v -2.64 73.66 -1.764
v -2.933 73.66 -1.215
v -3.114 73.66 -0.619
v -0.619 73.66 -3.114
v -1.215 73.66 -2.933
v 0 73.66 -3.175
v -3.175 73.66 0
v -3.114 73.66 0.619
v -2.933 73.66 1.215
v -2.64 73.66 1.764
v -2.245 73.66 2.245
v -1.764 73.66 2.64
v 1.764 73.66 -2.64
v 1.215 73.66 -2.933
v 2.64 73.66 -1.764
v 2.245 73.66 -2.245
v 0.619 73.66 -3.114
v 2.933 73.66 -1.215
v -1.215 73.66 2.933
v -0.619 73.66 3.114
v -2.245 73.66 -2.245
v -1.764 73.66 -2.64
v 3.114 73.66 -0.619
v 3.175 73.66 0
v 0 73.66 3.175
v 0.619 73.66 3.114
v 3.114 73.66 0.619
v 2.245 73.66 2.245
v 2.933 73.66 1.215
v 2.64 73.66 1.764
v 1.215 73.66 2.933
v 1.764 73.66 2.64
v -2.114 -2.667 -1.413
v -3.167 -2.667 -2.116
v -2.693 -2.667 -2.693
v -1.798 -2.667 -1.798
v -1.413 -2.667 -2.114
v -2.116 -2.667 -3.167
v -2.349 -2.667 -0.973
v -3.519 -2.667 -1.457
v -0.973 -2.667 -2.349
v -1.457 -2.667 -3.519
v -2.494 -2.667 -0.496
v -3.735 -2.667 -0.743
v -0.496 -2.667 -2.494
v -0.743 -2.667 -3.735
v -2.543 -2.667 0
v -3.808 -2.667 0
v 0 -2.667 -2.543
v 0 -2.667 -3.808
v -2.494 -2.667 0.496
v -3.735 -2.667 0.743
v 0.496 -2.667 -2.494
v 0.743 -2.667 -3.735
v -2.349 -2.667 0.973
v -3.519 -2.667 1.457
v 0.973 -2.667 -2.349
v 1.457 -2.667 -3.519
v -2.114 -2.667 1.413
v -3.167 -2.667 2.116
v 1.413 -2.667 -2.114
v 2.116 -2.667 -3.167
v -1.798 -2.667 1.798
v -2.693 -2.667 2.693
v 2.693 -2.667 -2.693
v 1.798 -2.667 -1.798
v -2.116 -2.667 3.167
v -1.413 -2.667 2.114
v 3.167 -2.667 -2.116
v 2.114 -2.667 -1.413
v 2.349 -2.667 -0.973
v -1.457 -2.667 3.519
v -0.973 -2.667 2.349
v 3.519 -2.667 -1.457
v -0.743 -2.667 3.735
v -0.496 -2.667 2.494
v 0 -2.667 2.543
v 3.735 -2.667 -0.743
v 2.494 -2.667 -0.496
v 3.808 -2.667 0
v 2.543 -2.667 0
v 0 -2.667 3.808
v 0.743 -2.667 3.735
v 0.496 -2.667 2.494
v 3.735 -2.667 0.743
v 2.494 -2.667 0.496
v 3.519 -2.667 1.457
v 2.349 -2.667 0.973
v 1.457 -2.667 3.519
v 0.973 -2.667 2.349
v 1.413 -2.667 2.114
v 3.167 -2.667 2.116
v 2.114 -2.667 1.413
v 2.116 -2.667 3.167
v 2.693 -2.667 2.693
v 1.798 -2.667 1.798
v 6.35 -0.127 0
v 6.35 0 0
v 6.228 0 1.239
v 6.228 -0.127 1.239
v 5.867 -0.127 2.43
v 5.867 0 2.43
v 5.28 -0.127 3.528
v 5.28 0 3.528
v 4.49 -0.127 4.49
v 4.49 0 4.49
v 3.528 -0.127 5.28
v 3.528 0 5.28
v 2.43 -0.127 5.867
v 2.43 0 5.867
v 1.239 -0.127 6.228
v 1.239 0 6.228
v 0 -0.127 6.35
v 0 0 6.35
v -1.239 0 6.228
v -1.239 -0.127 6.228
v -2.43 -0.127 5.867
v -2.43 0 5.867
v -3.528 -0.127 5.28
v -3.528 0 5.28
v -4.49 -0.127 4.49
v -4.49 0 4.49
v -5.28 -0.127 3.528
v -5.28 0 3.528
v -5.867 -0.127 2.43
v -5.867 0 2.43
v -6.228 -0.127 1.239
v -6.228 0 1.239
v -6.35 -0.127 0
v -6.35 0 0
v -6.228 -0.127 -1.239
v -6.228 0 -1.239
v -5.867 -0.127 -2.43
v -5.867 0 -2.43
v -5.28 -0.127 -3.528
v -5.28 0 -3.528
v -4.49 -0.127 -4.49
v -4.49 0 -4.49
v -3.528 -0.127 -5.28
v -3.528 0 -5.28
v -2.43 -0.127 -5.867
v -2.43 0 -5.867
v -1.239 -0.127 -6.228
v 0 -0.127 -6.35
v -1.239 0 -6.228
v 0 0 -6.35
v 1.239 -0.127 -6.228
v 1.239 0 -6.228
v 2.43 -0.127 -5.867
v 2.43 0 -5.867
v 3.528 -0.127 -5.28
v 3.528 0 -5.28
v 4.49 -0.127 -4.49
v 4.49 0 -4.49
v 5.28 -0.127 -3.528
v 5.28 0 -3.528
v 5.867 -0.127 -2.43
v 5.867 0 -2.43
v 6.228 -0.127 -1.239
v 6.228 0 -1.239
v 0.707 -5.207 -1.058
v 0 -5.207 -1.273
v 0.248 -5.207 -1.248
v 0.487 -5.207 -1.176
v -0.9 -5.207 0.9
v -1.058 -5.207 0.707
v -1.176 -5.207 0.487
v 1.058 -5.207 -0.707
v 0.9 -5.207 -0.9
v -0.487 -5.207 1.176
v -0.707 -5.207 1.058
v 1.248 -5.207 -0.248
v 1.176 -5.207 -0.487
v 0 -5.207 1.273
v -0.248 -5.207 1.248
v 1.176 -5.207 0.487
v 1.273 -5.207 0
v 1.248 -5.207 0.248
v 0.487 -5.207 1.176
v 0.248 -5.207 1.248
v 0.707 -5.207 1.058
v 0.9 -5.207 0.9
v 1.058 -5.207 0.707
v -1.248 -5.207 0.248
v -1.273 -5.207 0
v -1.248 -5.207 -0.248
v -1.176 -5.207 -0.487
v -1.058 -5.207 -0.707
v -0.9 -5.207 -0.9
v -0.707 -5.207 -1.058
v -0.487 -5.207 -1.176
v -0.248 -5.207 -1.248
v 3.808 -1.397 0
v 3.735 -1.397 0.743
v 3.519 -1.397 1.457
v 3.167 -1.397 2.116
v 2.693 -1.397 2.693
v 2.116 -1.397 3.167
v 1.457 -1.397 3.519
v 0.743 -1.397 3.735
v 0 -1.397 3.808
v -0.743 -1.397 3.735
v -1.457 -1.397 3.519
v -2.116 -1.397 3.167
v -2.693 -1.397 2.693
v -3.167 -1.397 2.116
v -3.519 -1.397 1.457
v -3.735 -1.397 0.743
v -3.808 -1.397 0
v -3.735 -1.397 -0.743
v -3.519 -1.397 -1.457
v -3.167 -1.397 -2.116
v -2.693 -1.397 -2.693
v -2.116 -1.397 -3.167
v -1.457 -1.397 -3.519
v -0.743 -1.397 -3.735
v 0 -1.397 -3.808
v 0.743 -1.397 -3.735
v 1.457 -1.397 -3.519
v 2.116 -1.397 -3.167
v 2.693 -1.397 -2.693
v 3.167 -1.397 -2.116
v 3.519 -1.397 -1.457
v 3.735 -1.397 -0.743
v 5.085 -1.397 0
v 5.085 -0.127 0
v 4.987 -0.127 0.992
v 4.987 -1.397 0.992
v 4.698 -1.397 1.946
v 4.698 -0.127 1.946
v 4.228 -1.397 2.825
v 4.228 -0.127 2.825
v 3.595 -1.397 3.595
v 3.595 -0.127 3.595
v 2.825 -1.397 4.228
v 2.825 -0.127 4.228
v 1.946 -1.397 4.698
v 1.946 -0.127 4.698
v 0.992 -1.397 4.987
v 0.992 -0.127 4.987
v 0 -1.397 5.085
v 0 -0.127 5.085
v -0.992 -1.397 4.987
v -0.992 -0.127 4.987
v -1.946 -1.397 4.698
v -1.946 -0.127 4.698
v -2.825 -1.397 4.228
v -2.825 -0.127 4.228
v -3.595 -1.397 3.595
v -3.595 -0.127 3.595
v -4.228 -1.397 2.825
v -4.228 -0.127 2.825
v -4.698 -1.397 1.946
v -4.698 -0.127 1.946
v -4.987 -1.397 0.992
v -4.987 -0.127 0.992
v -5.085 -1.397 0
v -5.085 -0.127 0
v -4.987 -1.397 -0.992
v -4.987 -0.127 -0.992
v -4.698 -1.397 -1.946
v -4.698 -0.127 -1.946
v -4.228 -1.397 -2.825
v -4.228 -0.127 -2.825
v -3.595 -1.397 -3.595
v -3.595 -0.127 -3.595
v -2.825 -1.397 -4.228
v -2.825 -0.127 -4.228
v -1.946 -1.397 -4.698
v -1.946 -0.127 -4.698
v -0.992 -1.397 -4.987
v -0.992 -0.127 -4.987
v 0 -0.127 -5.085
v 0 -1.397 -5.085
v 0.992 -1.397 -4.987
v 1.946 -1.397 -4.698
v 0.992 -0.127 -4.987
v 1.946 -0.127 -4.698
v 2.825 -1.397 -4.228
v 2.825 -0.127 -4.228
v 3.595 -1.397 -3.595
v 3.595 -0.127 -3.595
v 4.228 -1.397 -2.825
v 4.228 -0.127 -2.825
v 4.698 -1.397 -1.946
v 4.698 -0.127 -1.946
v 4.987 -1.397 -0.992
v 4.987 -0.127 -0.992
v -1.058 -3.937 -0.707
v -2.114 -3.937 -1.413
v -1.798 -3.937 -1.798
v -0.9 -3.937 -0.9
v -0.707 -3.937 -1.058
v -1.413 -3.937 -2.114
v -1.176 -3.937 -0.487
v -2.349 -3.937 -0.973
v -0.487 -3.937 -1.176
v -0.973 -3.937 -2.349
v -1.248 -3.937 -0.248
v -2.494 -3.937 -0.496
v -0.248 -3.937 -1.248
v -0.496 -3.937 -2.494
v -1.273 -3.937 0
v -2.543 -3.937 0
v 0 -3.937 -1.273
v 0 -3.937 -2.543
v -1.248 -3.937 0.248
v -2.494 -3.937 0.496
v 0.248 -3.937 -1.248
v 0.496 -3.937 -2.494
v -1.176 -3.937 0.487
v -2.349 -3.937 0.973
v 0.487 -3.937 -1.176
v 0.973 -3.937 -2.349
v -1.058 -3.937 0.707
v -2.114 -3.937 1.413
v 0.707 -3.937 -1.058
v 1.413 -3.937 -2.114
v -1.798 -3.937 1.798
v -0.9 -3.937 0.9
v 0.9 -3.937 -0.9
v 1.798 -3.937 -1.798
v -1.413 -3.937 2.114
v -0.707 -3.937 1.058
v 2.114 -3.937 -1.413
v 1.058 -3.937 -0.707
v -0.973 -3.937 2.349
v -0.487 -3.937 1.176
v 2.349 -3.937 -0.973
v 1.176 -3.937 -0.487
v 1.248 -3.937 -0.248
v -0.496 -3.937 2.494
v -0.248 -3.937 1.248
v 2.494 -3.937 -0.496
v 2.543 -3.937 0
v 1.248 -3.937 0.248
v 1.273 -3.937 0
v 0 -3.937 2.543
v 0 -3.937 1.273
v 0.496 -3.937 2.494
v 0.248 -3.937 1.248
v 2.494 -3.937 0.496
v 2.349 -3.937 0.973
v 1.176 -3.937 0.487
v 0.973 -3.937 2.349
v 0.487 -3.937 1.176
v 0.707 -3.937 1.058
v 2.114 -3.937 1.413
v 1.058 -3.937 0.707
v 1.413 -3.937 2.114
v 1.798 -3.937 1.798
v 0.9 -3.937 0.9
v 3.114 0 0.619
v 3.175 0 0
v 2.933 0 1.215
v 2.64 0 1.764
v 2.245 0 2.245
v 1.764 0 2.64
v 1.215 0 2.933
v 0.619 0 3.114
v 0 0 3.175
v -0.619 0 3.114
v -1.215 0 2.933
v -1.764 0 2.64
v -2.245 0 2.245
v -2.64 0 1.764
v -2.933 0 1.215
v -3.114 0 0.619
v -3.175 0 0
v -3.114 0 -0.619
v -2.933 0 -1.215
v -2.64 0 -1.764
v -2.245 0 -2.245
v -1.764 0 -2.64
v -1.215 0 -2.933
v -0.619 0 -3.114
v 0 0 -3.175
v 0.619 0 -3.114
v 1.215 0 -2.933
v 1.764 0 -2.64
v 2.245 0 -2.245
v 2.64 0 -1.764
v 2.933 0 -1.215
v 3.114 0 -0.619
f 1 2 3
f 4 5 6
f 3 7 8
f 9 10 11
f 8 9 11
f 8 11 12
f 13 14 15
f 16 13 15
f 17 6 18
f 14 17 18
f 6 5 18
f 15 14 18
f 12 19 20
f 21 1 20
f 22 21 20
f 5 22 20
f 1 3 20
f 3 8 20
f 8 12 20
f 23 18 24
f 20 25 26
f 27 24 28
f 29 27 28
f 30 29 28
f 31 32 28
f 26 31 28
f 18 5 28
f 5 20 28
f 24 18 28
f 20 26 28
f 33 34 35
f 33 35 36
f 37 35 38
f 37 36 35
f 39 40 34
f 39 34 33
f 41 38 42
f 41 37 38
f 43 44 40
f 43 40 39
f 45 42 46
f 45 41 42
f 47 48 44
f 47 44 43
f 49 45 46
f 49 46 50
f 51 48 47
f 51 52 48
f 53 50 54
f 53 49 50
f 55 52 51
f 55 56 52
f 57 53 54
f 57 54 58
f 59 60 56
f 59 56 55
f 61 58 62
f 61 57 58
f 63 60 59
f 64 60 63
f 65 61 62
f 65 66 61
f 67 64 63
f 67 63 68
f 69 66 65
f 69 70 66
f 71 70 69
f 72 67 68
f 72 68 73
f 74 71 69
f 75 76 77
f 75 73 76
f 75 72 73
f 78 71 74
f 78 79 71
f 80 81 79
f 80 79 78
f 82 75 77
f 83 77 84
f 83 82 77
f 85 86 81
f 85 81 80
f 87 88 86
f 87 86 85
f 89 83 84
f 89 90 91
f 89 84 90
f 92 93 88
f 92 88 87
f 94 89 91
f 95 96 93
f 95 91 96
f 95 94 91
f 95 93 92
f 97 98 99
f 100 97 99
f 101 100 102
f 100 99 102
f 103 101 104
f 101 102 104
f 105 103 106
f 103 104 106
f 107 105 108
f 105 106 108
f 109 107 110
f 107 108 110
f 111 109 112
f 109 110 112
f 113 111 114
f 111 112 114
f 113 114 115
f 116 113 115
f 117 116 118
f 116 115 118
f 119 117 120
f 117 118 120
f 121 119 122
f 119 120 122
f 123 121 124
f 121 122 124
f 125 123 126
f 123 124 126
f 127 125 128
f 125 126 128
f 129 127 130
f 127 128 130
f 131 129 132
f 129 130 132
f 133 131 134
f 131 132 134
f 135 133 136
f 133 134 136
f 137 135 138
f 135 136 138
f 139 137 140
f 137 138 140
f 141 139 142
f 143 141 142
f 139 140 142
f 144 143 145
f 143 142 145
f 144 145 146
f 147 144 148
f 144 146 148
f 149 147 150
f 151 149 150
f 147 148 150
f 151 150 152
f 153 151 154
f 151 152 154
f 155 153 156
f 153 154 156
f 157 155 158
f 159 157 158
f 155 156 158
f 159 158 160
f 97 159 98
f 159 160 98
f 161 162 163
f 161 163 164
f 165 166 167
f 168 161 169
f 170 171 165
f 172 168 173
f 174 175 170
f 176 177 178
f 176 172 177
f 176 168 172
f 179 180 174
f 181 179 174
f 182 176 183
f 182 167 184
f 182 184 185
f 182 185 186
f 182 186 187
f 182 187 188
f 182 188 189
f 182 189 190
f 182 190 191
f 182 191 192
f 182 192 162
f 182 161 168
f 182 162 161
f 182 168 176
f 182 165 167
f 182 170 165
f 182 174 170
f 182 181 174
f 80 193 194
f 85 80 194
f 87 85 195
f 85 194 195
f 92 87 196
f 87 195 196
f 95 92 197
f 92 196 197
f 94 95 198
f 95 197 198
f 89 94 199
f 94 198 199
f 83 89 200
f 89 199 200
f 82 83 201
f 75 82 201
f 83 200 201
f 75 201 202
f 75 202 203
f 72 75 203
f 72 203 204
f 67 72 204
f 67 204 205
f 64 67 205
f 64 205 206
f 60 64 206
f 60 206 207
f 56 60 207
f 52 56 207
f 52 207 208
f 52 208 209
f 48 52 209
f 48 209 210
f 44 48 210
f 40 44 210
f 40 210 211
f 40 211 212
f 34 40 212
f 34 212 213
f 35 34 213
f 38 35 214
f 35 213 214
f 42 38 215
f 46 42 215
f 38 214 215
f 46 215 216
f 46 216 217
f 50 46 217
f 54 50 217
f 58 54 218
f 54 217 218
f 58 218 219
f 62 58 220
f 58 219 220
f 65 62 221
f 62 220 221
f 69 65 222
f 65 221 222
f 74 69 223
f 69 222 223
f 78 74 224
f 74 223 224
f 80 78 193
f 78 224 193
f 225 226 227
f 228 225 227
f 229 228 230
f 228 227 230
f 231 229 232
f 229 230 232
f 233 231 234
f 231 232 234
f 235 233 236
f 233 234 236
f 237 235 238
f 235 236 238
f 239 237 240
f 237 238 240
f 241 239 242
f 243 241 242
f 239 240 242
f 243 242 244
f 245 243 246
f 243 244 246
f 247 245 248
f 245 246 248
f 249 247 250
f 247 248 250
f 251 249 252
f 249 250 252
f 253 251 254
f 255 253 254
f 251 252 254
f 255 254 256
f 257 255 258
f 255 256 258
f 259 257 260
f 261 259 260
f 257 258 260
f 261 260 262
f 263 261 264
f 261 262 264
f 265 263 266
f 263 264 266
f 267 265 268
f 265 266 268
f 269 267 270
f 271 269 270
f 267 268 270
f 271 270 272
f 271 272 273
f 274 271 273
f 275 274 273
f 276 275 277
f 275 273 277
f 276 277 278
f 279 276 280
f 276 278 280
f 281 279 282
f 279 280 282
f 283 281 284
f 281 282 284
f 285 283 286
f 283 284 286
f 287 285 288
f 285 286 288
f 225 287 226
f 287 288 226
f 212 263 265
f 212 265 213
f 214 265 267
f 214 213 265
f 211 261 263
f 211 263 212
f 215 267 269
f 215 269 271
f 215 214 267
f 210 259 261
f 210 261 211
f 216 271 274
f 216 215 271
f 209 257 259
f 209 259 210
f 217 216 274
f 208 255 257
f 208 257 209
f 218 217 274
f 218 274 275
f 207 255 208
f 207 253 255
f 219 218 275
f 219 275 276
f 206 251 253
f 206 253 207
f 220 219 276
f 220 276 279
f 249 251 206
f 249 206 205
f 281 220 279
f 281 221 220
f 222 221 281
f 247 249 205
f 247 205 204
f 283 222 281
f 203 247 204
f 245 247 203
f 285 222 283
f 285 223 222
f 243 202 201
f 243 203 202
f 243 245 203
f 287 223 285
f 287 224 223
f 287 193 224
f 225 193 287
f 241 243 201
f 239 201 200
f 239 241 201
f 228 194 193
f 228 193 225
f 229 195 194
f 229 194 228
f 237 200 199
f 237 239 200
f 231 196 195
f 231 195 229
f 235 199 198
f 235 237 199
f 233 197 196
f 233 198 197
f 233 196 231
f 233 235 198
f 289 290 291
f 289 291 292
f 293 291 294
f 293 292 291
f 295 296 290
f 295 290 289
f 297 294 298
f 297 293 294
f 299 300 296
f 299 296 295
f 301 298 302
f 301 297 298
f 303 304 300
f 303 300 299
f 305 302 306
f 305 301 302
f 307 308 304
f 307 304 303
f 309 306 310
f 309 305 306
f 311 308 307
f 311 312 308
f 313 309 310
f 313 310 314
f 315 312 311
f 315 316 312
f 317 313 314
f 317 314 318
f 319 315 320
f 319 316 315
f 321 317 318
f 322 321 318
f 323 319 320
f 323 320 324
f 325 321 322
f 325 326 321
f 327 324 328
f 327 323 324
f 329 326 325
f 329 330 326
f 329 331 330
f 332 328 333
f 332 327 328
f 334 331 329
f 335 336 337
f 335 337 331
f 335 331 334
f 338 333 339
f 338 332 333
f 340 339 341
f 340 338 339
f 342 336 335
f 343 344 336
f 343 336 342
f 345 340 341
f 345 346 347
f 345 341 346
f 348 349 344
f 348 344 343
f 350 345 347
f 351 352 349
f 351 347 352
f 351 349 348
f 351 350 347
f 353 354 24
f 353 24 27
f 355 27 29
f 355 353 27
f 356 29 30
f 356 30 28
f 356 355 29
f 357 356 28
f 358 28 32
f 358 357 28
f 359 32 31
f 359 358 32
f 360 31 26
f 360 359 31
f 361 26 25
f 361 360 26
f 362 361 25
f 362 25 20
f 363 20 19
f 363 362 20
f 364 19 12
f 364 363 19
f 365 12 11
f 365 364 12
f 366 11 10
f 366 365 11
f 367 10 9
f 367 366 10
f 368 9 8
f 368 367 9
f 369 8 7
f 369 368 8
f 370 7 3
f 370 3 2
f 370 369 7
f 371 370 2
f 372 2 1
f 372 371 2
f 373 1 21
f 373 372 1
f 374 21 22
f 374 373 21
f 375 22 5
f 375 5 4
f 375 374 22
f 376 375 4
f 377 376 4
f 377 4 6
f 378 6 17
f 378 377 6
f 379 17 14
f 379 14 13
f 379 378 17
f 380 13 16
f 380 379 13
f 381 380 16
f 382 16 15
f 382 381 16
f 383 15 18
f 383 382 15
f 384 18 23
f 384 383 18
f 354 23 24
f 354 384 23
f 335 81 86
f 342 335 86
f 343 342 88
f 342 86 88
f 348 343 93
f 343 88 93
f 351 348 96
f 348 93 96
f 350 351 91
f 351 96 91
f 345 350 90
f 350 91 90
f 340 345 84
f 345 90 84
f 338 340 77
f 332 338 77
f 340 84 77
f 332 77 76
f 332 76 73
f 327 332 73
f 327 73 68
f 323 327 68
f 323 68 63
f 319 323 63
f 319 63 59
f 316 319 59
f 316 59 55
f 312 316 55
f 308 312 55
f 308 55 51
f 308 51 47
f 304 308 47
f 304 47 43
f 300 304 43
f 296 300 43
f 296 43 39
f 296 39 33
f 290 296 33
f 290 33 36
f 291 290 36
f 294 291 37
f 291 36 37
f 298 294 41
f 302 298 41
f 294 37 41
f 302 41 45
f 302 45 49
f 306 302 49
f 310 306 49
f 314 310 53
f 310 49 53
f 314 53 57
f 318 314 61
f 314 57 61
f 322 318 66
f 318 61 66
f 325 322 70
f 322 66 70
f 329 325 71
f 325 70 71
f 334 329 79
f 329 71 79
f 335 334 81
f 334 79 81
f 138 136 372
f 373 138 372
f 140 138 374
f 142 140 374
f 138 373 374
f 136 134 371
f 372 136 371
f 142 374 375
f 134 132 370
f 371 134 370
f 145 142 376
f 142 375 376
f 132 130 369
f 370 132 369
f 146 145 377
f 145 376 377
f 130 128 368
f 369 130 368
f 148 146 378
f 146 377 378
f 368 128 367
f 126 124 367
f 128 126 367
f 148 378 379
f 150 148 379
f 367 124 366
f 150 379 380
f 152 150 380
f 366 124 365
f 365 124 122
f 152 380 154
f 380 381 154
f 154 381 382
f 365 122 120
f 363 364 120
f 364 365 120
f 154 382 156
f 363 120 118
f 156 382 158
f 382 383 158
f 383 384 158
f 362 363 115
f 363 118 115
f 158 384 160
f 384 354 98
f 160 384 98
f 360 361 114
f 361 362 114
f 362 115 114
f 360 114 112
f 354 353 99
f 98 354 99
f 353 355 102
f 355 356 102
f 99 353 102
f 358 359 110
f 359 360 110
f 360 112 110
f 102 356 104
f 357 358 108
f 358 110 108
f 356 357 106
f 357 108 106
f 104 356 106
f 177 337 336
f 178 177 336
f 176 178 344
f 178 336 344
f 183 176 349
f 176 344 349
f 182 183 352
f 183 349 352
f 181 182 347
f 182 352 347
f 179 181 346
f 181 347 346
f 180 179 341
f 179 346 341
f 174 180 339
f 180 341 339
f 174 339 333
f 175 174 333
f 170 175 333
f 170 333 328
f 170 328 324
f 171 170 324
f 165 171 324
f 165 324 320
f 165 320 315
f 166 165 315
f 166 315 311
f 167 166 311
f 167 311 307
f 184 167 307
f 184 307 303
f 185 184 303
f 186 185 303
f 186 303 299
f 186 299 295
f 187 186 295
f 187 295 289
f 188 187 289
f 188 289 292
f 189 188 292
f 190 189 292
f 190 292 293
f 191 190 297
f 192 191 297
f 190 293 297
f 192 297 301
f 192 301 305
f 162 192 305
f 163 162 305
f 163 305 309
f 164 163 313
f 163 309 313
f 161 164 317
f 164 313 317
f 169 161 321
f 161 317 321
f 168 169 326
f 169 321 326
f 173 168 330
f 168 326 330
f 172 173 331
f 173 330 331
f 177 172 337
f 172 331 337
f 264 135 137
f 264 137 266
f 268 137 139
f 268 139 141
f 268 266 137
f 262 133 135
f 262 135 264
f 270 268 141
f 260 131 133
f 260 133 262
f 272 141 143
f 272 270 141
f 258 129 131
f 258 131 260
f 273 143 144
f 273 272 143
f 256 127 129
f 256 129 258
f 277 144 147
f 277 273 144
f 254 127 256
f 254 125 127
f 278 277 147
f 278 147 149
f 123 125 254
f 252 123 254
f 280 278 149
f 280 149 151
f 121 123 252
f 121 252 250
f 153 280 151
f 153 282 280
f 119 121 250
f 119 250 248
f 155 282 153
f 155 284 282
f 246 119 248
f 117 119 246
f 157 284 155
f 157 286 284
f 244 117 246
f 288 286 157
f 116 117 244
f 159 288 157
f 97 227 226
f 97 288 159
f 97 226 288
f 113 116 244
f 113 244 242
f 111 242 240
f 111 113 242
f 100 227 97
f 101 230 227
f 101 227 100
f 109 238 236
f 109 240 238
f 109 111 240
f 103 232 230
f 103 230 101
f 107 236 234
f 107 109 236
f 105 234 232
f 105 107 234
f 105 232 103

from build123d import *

# Parameters (mm, degrees)
F0_R     = 6.35
F1_DEPTH = 0.127
F3_R     = 5.084665
F3_R_2   = 3.808429
F4_DEPTH = 1.27
F3_R_3   = 2.542971
F5_DEPTH = 2.54
F3_R_4   = 1.272508
F6_DEPTH = 3.81
F7_DEPTH = 5.08
F8_R     = 3.175
F9_DEPTH = 73.66


with BuildPart() as f1:
    # F0 (on Front) → F1 (new body)
    with BuildSketch(Plane.XZ):
        Circle(F0_R)
    extrude(amount=F1_DEPTH)

    # F3 (on face) → F4 (join)
    with BuildSketch(Plane.XZ.offset(0.127)):
        Circle(F3_R)
        Circle(F3_R_2, mode=Mode.SUBTRACT)
    extrude(amount=F4_DEPTH)

    # F3 (on face) → F5 (join)
    with BuildSketch(Plane.XZ.offset(0.127)):
        Circle(F3_R_2)
        Circle(F3_R_3, mode=Mode.SUBTRACT)
    extrude(amount=F5_DEPTH)

    # F3 (on face) → F6 (join)
    with BuildSketch(Plane.XZ.offset(0.127)):
        Circle(F3_R_3)
        Circle(F3_R_4, mode=Mode.SUBTRACT)
    extrude(amount=F6_DEPTH)

    # F3 (on face) → F7 (join)
    with BuildSketch(Plane.XZ.offset(0.127)):
        Circle(F3_R_4)
    extrude(amount=F7_DEPTH)

    # F8 (on face) → F9 (join)
    with BuildSketch(Plane.XZ):
        Circle(F8_R)
    extrude(amount=-F9_DEPTH)


solid = f1.part
